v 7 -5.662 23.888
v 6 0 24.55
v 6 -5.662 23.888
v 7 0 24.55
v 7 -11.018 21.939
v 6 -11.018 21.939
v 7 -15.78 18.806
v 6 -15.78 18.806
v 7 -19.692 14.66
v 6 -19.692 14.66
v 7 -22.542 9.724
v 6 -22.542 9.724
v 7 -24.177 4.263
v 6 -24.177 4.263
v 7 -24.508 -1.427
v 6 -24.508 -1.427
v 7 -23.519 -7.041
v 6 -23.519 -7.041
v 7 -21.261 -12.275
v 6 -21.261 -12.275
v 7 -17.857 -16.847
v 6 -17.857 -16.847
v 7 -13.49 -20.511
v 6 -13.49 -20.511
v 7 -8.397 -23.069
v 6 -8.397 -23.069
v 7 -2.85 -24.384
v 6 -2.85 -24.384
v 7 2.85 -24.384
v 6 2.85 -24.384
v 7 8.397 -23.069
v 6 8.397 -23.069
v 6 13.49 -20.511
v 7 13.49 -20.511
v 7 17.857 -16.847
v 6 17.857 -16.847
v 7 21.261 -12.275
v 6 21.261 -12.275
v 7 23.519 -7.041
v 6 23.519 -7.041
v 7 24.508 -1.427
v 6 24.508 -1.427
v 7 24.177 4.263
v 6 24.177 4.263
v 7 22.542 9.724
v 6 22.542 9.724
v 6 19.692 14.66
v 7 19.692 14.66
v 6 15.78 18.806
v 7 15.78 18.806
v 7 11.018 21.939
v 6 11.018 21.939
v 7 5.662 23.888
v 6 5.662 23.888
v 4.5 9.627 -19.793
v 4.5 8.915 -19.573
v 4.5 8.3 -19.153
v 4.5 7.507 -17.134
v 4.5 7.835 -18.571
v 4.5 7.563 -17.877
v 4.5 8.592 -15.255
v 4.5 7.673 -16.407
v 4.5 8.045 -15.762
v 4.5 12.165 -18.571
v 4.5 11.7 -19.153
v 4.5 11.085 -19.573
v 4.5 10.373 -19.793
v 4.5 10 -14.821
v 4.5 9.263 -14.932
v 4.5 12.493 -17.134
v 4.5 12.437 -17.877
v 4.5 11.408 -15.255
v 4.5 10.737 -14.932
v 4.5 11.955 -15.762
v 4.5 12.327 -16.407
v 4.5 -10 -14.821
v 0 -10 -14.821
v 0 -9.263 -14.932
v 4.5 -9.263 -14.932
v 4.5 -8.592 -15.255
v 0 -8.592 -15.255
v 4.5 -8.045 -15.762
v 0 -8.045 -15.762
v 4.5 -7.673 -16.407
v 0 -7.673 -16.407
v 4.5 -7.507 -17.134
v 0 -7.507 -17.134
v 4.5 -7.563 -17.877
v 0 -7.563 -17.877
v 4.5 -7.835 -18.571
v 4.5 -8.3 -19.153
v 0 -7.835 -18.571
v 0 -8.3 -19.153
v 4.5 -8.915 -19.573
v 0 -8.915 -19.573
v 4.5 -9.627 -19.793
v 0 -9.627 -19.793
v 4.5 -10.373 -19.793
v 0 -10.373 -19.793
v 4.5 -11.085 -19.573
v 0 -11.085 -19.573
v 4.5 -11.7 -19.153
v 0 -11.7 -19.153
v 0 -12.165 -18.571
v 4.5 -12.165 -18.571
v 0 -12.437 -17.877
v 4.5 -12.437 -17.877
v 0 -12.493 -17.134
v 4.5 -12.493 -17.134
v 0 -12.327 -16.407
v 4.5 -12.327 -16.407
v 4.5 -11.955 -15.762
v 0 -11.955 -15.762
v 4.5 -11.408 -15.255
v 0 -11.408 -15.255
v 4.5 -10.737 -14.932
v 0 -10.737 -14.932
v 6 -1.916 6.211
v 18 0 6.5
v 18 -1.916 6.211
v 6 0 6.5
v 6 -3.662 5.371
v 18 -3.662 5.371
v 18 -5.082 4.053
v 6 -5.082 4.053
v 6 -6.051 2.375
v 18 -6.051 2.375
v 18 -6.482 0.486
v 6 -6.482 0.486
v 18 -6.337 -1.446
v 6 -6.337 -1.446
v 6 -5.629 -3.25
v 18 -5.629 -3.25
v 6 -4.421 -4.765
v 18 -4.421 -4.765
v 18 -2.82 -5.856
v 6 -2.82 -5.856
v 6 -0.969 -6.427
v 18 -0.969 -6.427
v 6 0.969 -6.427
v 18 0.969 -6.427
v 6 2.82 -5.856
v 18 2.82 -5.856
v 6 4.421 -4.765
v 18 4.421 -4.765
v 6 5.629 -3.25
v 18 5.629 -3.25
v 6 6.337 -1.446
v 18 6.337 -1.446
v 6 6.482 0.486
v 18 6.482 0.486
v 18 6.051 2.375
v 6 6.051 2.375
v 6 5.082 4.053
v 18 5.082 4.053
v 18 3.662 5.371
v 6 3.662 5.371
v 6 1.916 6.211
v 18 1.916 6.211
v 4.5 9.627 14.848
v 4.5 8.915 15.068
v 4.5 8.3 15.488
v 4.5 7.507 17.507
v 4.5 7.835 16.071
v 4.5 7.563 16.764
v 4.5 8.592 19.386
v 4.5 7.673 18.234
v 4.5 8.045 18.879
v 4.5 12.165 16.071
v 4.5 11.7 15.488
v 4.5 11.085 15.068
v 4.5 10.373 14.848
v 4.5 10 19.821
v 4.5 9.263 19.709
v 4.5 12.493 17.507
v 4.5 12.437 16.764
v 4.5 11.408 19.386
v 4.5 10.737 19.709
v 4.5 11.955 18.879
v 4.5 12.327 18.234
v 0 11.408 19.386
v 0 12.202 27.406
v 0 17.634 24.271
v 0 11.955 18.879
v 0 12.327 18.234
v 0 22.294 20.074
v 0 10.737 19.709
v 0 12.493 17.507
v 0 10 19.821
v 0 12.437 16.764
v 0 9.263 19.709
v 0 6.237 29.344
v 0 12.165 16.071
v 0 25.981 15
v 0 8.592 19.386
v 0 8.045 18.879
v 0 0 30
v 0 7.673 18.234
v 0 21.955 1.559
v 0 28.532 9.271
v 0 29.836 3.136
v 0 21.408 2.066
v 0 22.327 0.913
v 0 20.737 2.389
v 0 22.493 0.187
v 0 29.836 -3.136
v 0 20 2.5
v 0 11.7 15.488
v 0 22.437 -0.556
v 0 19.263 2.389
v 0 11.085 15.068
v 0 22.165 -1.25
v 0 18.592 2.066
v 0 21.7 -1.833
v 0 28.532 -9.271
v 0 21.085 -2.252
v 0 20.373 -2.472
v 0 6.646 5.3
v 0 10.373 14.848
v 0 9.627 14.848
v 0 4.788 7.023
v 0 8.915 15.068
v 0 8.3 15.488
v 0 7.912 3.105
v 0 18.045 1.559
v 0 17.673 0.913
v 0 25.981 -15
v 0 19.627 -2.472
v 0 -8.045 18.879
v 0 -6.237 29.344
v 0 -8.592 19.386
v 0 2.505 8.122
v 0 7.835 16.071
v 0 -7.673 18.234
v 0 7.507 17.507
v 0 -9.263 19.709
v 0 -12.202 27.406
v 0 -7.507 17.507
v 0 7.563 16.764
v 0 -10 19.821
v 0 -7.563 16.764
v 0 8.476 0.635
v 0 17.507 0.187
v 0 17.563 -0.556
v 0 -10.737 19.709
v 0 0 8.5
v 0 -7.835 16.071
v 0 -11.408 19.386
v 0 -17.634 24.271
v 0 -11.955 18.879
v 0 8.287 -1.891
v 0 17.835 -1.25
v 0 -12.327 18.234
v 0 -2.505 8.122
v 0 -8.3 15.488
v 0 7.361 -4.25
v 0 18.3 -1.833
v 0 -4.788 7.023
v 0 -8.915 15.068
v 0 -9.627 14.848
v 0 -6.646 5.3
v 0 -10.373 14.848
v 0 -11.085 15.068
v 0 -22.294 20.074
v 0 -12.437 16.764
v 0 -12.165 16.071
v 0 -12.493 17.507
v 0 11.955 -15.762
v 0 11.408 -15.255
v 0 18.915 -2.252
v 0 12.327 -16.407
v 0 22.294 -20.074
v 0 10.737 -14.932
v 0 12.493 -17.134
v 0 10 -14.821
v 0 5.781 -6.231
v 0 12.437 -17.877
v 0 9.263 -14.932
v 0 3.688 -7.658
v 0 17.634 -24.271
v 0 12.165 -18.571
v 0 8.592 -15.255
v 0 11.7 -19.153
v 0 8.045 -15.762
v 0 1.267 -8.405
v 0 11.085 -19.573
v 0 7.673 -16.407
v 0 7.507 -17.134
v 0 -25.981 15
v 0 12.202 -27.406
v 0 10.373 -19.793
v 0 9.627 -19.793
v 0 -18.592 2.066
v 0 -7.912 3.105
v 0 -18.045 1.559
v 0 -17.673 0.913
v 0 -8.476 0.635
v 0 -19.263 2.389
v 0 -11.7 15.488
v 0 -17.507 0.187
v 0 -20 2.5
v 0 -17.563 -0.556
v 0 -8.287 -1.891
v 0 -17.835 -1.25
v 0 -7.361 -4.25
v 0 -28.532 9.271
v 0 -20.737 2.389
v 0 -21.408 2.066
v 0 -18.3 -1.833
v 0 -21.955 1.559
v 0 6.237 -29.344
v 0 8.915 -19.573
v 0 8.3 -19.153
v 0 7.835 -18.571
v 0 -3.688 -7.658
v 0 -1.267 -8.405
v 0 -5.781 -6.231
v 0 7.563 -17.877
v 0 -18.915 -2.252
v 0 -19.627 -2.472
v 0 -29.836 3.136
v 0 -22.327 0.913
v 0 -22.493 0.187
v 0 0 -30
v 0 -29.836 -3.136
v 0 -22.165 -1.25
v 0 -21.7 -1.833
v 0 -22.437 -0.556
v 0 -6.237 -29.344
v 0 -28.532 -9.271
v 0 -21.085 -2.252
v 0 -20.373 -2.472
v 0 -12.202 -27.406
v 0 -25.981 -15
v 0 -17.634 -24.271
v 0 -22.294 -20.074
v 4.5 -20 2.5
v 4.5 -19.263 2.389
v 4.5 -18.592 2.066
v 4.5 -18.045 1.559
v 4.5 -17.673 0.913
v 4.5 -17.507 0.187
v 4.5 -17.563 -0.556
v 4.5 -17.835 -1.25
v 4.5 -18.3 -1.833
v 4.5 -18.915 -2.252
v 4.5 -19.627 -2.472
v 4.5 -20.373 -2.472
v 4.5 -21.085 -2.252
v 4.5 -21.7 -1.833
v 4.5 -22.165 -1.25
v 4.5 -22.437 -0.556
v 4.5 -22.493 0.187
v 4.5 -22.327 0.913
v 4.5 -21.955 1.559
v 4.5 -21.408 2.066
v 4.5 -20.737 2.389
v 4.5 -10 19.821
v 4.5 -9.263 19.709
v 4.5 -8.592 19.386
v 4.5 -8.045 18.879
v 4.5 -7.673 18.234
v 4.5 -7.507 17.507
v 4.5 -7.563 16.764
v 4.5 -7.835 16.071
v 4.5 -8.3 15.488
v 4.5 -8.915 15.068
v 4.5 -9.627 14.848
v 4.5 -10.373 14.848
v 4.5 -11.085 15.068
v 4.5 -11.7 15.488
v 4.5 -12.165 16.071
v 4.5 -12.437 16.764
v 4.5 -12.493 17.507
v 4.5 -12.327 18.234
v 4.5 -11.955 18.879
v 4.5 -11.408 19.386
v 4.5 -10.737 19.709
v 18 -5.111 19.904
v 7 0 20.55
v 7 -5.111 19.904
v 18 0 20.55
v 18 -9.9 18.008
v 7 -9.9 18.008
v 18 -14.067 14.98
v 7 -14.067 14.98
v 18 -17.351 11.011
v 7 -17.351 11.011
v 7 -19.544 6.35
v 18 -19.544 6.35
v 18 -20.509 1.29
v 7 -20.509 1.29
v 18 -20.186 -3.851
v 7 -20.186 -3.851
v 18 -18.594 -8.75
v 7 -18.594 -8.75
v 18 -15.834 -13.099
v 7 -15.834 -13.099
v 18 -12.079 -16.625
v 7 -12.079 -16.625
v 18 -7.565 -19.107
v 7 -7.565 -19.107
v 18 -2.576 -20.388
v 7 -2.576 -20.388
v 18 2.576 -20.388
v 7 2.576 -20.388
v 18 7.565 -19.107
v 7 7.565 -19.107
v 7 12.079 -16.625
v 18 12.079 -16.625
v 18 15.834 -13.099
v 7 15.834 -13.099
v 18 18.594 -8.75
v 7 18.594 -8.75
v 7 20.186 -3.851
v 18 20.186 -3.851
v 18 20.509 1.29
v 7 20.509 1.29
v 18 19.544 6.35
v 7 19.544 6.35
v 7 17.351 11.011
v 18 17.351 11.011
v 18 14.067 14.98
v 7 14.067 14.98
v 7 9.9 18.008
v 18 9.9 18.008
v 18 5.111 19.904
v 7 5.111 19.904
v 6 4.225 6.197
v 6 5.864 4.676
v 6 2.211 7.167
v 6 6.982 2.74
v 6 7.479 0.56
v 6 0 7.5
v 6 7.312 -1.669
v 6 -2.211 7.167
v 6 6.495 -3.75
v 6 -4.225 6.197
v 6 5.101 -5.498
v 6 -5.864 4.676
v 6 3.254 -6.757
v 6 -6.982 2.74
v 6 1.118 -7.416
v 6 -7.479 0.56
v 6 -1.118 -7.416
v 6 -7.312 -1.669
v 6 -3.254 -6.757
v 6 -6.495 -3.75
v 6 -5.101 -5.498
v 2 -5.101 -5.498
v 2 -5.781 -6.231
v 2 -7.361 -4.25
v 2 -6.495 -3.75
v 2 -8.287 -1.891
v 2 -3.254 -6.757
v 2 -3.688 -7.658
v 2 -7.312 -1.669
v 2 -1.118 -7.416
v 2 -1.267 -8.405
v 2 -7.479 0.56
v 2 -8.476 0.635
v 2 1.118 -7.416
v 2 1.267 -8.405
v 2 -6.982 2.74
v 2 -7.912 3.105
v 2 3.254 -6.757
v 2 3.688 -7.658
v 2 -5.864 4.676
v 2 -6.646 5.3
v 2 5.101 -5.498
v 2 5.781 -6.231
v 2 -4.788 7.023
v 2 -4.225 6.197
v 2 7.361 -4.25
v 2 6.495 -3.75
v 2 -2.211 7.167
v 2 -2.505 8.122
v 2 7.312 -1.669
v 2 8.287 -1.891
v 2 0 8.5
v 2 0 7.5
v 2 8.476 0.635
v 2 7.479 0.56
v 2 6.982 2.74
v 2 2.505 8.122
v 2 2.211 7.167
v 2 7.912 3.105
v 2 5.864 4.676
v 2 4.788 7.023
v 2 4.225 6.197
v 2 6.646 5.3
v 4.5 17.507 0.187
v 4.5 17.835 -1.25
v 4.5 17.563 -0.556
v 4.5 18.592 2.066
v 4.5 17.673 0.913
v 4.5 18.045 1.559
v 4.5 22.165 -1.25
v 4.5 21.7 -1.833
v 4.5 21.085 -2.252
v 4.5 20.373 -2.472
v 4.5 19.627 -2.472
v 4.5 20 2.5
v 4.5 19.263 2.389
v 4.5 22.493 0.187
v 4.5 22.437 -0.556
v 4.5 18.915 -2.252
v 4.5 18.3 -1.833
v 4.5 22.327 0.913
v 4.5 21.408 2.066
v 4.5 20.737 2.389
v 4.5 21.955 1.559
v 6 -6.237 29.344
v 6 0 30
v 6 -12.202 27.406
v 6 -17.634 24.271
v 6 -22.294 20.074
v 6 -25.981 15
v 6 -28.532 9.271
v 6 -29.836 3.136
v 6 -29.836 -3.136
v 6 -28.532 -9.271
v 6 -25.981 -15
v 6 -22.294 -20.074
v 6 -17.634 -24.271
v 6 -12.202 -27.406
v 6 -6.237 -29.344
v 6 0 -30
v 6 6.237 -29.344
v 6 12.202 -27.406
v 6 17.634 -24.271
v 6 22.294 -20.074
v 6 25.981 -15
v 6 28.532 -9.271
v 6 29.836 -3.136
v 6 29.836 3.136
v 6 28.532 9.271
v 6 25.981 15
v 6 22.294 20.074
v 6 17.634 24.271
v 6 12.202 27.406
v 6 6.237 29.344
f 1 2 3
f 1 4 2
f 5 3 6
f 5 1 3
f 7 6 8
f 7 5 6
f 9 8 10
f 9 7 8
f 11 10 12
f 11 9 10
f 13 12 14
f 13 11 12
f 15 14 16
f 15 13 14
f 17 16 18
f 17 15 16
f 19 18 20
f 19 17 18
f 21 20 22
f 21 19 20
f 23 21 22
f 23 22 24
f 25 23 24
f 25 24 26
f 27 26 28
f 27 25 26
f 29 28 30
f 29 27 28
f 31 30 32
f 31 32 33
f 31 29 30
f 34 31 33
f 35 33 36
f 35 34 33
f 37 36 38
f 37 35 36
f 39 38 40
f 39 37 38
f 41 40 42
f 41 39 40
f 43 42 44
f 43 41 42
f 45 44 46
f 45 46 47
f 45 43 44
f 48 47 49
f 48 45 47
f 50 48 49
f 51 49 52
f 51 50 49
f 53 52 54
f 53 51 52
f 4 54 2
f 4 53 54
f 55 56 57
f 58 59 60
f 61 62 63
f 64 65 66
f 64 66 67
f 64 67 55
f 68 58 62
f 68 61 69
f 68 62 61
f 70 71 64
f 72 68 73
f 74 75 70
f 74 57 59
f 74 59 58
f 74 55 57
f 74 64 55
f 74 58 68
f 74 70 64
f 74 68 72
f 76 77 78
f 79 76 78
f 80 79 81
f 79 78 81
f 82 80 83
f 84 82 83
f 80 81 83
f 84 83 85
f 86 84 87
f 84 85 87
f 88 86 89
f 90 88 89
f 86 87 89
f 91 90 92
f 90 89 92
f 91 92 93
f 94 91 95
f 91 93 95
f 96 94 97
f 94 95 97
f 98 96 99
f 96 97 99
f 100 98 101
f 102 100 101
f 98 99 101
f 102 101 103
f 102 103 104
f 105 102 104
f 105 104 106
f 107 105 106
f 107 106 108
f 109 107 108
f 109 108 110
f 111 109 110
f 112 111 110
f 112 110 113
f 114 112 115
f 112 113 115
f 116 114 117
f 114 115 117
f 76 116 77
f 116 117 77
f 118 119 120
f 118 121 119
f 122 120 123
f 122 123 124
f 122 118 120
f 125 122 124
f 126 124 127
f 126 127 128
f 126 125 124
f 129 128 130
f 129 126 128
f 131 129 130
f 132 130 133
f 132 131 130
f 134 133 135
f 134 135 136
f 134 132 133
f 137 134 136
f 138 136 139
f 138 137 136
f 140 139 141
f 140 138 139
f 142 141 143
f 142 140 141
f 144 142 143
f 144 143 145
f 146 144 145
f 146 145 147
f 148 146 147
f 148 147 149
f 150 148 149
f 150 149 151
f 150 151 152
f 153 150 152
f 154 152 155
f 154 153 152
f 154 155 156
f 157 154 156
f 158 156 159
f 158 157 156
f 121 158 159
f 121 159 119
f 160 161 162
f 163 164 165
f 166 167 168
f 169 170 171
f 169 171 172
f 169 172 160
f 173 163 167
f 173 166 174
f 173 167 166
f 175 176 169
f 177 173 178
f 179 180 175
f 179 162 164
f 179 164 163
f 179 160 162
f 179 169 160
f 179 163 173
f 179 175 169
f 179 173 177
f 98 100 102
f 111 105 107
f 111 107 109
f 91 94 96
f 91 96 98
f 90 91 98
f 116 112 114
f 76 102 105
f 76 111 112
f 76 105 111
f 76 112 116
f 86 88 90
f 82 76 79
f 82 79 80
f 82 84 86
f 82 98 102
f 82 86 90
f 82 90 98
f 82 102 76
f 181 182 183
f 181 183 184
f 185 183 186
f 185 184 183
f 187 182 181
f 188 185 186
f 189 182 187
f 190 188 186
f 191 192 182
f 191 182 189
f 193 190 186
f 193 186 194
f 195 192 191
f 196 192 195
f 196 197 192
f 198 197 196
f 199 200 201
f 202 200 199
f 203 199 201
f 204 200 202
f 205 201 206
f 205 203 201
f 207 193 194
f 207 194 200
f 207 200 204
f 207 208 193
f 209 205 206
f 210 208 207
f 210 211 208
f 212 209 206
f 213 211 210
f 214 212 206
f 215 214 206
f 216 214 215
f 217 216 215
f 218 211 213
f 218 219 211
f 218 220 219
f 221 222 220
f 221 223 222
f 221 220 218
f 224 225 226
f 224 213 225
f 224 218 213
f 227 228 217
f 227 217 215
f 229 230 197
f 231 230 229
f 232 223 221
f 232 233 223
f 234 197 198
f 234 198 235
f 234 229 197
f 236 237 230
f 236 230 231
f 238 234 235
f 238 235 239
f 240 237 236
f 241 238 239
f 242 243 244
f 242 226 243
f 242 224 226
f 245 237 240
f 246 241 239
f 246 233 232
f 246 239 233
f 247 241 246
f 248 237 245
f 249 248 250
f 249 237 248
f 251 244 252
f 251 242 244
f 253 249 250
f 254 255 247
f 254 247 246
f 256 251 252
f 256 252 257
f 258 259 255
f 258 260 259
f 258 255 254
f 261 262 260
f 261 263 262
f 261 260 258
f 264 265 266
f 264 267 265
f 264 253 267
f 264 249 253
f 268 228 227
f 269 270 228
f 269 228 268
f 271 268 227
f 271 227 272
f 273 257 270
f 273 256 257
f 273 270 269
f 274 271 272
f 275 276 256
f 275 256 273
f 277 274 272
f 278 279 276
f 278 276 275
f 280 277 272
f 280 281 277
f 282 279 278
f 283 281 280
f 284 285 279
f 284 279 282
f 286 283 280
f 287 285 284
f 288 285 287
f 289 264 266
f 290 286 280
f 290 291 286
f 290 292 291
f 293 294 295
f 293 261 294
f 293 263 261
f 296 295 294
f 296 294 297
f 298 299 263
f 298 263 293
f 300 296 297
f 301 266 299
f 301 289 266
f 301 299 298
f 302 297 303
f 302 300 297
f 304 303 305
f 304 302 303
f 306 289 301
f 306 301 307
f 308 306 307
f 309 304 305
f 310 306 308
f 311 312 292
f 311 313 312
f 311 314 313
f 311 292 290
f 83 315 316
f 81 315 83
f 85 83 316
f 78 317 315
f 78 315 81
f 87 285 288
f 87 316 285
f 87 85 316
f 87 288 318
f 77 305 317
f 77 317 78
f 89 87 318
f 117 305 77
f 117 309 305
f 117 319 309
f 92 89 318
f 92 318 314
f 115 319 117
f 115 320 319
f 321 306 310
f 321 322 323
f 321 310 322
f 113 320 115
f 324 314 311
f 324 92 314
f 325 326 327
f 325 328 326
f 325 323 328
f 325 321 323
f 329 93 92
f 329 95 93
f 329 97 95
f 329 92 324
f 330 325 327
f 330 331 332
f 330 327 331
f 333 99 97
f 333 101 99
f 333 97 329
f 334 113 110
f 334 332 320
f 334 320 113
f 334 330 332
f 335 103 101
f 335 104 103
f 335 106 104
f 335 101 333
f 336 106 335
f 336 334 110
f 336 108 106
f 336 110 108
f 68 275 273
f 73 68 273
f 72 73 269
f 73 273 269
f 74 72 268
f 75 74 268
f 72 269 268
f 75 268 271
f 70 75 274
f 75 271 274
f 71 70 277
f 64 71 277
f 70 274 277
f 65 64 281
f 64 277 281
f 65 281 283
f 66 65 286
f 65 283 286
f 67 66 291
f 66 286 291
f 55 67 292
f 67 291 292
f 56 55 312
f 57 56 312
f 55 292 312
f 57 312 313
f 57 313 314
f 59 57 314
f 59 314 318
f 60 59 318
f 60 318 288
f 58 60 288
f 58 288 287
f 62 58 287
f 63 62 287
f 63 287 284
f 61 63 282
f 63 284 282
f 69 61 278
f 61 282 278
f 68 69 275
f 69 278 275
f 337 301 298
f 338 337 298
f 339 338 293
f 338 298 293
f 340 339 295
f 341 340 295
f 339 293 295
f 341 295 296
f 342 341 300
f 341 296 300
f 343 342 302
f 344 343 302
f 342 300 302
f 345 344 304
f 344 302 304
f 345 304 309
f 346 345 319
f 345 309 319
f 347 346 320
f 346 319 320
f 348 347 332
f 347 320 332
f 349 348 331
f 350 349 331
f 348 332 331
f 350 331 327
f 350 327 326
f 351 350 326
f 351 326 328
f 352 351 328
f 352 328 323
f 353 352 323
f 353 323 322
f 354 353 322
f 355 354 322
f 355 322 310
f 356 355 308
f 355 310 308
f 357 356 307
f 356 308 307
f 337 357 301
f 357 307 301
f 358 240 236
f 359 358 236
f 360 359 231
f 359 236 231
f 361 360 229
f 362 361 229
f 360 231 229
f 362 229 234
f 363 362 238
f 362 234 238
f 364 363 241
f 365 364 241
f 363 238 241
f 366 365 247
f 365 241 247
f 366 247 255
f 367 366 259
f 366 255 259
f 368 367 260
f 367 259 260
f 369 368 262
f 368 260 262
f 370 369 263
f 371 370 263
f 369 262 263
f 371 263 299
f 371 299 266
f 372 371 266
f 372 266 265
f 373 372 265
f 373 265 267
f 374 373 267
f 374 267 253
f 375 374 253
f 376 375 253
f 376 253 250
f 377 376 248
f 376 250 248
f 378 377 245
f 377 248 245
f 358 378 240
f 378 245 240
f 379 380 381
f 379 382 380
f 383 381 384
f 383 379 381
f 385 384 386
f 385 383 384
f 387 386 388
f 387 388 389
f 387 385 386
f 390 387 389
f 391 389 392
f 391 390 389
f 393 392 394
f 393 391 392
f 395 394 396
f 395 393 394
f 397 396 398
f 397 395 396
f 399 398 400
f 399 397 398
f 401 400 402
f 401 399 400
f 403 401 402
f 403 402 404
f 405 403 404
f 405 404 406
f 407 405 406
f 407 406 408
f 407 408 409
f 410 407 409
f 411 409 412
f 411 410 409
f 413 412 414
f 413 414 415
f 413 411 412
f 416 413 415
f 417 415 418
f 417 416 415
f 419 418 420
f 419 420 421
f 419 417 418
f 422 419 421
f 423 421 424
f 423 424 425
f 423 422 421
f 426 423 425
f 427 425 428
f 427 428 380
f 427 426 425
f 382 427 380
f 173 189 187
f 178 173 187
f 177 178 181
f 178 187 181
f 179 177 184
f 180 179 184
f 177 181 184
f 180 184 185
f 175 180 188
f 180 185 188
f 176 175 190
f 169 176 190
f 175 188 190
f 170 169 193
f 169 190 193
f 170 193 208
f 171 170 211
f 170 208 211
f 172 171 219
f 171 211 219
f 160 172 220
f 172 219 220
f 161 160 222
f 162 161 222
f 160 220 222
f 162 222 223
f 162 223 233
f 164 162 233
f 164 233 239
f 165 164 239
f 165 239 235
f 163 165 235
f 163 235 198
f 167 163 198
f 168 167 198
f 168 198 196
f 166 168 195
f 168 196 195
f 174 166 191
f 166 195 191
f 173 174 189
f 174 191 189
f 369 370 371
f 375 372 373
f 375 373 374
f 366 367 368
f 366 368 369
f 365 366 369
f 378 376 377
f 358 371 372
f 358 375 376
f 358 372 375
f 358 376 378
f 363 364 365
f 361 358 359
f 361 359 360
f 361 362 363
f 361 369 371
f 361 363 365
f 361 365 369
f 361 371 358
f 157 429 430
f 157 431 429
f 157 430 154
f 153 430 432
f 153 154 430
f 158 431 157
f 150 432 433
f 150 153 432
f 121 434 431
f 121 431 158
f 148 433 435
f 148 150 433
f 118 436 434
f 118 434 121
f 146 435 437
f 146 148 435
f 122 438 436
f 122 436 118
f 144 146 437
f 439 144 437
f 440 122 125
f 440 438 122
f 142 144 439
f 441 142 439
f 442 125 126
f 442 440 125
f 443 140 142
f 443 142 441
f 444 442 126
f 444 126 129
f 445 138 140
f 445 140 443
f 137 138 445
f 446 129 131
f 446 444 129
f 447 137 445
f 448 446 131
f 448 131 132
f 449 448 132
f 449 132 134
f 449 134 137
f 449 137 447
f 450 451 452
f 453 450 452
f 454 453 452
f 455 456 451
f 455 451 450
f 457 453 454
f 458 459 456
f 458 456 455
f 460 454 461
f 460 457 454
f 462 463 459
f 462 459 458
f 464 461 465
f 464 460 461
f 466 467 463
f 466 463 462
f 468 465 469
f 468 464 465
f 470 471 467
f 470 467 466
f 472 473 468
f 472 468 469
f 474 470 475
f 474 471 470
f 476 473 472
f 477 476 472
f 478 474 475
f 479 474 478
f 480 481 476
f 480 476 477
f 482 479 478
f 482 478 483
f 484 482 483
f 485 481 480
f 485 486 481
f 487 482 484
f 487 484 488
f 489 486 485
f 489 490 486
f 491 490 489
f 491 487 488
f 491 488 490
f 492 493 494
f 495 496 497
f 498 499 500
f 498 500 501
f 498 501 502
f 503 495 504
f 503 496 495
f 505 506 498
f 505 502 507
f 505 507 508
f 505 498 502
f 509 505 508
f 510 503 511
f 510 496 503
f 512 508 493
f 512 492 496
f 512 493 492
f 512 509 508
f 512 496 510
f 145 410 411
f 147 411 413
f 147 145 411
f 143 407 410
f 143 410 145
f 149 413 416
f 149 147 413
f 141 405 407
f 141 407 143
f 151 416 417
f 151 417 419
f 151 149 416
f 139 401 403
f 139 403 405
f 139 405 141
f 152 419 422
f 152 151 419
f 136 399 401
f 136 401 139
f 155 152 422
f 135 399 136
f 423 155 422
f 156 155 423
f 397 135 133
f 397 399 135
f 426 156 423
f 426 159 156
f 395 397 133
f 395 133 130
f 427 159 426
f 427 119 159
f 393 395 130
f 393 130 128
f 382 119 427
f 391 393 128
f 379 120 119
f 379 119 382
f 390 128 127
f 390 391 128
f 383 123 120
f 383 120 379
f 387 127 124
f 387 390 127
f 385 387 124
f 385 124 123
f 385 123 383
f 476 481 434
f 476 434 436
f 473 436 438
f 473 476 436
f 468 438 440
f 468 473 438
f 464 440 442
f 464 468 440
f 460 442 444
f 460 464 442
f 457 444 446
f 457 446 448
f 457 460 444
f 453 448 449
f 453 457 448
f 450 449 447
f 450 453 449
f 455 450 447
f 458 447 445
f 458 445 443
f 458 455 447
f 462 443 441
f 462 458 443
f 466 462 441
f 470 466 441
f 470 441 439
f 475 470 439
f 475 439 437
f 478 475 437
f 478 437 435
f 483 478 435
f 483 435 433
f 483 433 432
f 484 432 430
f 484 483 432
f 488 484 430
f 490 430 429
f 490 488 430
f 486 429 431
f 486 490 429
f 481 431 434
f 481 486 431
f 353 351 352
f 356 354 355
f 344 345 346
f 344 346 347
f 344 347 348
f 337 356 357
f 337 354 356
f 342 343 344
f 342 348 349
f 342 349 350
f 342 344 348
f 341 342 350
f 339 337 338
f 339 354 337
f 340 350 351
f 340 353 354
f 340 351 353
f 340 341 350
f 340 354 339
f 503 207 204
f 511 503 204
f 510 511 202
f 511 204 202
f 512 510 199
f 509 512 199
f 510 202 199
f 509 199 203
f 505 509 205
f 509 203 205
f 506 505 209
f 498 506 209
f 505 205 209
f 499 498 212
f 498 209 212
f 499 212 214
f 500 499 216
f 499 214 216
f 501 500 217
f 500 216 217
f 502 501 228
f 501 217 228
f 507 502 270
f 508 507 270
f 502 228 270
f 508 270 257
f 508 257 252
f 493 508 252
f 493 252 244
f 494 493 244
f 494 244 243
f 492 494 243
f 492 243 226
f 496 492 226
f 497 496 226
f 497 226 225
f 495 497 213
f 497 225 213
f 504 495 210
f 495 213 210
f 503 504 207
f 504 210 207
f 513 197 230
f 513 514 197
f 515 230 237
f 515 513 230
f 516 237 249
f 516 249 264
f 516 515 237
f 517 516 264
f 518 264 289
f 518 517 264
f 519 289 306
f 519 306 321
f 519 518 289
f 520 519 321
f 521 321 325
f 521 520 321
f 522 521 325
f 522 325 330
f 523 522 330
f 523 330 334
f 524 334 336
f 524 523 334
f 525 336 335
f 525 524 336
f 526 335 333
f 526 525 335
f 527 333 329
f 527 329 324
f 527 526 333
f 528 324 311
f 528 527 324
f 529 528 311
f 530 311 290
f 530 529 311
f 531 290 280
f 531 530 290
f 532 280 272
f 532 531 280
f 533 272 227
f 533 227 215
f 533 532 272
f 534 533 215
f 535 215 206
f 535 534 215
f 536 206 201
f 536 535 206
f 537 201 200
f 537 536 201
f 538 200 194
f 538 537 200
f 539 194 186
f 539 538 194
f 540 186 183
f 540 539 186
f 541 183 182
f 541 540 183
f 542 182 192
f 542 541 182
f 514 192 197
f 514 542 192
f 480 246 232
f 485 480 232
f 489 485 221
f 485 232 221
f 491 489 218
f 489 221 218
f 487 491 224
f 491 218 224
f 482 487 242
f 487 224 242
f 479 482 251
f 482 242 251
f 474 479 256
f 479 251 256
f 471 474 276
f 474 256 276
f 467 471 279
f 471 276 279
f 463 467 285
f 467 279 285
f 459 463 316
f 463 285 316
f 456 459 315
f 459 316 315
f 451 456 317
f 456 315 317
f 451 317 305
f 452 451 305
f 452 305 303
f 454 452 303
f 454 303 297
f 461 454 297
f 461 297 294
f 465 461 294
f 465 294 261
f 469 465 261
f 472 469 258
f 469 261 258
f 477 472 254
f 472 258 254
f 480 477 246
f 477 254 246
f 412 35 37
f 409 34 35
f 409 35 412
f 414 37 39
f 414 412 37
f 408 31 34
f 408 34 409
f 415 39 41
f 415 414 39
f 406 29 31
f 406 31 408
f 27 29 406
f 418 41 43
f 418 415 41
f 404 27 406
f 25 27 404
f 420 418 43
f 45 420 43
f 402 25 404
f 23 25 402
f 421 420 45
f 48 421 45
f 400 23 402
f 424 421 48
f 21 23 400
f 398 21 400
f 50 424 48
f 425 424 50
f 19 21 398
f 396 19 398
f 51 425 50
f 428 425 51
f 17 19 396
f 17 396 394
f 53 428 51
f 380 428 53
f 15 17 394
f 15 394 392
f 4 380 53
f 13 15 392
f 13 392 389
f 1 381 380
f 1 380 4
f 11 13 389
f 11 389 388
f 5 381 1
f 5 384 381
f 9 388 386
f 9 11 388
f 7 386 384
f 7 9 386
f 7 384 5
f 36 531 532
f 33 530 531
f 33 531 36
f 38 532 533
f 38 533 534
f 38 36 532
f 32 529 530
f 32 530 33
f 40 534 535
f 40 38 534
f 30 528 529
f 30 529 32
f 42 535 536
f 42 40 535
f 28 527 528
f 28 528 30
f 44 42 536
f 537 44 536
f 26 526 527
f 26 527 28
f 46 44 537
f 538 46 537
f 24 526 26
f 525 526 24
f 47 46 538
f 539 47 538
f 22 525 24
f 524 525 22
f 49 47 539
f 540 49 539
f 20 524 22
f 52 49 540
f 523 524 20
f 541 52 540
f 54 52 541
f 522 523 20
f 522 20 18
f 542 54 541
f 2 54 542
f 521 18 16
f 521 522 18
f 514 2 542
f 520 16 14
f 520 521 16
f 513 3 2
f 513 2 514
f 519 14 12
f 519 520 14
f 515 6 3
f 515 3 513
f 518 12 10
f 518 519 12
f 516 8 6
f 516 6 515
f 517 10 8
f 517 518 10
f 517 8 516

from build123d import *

# Parameters (mm, degrees)
SKETCH2_R          = 2.5
CUT_EXTRUDE1_DEPTH = 4.5
SKETCH4_R          = 8.5
CUT_EXTRUDE3_DEPTH = 2


with BuildPart() as part:
    # Sketch1 → Revolve1 (revolve)
    with BuildSketch(Plane.XY, mode=Mode.PRIVATE) as revolve1_sk:
        Polygon((0, 30), (6, 30), (6, 24.55), (7, 24.55), (7, 20.55), (18, 20.55), (18, 6.5), (6, 6.5), (6, 7.5), (0, 7.5), align=None)
    revolve(revolve1_sk.sketch.rotate(Axis((0, 0, 0), (1, 0, 0)), 90), axis=Axis((0, 0, 0), (1, 0, 0)))

    # Sketch2 → Cut-Extrude1 (cut)
    with BuildSketch(Plane.ZY):
        with Locations((0, 20)):
            Circle(SKETCH2_R)
        with Locations((17.320508076, 10)):
            Circle(SKETCH2_R)
        with Locations((17.320508076, -10)):
            Circle(SKETCH2_R)
        with Locations((0, -20)):
            Circle(SKETCH2_R)
        with Locations((-17.320508076, -10)):
            Circle(SKETCH2_R)
        with Locations((-17.320508076, 10)):
            Circle(SKETCH2_R)
    extrude(amount=-CUT_EXTRUDE1_DEPTH, mode=Mode.SUBTRACT)

    # Sketch4 → Cut-Extrude3 (cut)
    with BuildSketch(Plane.ZY):
        Circle(SKETCH4_R)
    extrude(amount=-CUT_EXTRUDE3_DEPTH, mode=Mode.SUBTRACT)


solid = part.part
